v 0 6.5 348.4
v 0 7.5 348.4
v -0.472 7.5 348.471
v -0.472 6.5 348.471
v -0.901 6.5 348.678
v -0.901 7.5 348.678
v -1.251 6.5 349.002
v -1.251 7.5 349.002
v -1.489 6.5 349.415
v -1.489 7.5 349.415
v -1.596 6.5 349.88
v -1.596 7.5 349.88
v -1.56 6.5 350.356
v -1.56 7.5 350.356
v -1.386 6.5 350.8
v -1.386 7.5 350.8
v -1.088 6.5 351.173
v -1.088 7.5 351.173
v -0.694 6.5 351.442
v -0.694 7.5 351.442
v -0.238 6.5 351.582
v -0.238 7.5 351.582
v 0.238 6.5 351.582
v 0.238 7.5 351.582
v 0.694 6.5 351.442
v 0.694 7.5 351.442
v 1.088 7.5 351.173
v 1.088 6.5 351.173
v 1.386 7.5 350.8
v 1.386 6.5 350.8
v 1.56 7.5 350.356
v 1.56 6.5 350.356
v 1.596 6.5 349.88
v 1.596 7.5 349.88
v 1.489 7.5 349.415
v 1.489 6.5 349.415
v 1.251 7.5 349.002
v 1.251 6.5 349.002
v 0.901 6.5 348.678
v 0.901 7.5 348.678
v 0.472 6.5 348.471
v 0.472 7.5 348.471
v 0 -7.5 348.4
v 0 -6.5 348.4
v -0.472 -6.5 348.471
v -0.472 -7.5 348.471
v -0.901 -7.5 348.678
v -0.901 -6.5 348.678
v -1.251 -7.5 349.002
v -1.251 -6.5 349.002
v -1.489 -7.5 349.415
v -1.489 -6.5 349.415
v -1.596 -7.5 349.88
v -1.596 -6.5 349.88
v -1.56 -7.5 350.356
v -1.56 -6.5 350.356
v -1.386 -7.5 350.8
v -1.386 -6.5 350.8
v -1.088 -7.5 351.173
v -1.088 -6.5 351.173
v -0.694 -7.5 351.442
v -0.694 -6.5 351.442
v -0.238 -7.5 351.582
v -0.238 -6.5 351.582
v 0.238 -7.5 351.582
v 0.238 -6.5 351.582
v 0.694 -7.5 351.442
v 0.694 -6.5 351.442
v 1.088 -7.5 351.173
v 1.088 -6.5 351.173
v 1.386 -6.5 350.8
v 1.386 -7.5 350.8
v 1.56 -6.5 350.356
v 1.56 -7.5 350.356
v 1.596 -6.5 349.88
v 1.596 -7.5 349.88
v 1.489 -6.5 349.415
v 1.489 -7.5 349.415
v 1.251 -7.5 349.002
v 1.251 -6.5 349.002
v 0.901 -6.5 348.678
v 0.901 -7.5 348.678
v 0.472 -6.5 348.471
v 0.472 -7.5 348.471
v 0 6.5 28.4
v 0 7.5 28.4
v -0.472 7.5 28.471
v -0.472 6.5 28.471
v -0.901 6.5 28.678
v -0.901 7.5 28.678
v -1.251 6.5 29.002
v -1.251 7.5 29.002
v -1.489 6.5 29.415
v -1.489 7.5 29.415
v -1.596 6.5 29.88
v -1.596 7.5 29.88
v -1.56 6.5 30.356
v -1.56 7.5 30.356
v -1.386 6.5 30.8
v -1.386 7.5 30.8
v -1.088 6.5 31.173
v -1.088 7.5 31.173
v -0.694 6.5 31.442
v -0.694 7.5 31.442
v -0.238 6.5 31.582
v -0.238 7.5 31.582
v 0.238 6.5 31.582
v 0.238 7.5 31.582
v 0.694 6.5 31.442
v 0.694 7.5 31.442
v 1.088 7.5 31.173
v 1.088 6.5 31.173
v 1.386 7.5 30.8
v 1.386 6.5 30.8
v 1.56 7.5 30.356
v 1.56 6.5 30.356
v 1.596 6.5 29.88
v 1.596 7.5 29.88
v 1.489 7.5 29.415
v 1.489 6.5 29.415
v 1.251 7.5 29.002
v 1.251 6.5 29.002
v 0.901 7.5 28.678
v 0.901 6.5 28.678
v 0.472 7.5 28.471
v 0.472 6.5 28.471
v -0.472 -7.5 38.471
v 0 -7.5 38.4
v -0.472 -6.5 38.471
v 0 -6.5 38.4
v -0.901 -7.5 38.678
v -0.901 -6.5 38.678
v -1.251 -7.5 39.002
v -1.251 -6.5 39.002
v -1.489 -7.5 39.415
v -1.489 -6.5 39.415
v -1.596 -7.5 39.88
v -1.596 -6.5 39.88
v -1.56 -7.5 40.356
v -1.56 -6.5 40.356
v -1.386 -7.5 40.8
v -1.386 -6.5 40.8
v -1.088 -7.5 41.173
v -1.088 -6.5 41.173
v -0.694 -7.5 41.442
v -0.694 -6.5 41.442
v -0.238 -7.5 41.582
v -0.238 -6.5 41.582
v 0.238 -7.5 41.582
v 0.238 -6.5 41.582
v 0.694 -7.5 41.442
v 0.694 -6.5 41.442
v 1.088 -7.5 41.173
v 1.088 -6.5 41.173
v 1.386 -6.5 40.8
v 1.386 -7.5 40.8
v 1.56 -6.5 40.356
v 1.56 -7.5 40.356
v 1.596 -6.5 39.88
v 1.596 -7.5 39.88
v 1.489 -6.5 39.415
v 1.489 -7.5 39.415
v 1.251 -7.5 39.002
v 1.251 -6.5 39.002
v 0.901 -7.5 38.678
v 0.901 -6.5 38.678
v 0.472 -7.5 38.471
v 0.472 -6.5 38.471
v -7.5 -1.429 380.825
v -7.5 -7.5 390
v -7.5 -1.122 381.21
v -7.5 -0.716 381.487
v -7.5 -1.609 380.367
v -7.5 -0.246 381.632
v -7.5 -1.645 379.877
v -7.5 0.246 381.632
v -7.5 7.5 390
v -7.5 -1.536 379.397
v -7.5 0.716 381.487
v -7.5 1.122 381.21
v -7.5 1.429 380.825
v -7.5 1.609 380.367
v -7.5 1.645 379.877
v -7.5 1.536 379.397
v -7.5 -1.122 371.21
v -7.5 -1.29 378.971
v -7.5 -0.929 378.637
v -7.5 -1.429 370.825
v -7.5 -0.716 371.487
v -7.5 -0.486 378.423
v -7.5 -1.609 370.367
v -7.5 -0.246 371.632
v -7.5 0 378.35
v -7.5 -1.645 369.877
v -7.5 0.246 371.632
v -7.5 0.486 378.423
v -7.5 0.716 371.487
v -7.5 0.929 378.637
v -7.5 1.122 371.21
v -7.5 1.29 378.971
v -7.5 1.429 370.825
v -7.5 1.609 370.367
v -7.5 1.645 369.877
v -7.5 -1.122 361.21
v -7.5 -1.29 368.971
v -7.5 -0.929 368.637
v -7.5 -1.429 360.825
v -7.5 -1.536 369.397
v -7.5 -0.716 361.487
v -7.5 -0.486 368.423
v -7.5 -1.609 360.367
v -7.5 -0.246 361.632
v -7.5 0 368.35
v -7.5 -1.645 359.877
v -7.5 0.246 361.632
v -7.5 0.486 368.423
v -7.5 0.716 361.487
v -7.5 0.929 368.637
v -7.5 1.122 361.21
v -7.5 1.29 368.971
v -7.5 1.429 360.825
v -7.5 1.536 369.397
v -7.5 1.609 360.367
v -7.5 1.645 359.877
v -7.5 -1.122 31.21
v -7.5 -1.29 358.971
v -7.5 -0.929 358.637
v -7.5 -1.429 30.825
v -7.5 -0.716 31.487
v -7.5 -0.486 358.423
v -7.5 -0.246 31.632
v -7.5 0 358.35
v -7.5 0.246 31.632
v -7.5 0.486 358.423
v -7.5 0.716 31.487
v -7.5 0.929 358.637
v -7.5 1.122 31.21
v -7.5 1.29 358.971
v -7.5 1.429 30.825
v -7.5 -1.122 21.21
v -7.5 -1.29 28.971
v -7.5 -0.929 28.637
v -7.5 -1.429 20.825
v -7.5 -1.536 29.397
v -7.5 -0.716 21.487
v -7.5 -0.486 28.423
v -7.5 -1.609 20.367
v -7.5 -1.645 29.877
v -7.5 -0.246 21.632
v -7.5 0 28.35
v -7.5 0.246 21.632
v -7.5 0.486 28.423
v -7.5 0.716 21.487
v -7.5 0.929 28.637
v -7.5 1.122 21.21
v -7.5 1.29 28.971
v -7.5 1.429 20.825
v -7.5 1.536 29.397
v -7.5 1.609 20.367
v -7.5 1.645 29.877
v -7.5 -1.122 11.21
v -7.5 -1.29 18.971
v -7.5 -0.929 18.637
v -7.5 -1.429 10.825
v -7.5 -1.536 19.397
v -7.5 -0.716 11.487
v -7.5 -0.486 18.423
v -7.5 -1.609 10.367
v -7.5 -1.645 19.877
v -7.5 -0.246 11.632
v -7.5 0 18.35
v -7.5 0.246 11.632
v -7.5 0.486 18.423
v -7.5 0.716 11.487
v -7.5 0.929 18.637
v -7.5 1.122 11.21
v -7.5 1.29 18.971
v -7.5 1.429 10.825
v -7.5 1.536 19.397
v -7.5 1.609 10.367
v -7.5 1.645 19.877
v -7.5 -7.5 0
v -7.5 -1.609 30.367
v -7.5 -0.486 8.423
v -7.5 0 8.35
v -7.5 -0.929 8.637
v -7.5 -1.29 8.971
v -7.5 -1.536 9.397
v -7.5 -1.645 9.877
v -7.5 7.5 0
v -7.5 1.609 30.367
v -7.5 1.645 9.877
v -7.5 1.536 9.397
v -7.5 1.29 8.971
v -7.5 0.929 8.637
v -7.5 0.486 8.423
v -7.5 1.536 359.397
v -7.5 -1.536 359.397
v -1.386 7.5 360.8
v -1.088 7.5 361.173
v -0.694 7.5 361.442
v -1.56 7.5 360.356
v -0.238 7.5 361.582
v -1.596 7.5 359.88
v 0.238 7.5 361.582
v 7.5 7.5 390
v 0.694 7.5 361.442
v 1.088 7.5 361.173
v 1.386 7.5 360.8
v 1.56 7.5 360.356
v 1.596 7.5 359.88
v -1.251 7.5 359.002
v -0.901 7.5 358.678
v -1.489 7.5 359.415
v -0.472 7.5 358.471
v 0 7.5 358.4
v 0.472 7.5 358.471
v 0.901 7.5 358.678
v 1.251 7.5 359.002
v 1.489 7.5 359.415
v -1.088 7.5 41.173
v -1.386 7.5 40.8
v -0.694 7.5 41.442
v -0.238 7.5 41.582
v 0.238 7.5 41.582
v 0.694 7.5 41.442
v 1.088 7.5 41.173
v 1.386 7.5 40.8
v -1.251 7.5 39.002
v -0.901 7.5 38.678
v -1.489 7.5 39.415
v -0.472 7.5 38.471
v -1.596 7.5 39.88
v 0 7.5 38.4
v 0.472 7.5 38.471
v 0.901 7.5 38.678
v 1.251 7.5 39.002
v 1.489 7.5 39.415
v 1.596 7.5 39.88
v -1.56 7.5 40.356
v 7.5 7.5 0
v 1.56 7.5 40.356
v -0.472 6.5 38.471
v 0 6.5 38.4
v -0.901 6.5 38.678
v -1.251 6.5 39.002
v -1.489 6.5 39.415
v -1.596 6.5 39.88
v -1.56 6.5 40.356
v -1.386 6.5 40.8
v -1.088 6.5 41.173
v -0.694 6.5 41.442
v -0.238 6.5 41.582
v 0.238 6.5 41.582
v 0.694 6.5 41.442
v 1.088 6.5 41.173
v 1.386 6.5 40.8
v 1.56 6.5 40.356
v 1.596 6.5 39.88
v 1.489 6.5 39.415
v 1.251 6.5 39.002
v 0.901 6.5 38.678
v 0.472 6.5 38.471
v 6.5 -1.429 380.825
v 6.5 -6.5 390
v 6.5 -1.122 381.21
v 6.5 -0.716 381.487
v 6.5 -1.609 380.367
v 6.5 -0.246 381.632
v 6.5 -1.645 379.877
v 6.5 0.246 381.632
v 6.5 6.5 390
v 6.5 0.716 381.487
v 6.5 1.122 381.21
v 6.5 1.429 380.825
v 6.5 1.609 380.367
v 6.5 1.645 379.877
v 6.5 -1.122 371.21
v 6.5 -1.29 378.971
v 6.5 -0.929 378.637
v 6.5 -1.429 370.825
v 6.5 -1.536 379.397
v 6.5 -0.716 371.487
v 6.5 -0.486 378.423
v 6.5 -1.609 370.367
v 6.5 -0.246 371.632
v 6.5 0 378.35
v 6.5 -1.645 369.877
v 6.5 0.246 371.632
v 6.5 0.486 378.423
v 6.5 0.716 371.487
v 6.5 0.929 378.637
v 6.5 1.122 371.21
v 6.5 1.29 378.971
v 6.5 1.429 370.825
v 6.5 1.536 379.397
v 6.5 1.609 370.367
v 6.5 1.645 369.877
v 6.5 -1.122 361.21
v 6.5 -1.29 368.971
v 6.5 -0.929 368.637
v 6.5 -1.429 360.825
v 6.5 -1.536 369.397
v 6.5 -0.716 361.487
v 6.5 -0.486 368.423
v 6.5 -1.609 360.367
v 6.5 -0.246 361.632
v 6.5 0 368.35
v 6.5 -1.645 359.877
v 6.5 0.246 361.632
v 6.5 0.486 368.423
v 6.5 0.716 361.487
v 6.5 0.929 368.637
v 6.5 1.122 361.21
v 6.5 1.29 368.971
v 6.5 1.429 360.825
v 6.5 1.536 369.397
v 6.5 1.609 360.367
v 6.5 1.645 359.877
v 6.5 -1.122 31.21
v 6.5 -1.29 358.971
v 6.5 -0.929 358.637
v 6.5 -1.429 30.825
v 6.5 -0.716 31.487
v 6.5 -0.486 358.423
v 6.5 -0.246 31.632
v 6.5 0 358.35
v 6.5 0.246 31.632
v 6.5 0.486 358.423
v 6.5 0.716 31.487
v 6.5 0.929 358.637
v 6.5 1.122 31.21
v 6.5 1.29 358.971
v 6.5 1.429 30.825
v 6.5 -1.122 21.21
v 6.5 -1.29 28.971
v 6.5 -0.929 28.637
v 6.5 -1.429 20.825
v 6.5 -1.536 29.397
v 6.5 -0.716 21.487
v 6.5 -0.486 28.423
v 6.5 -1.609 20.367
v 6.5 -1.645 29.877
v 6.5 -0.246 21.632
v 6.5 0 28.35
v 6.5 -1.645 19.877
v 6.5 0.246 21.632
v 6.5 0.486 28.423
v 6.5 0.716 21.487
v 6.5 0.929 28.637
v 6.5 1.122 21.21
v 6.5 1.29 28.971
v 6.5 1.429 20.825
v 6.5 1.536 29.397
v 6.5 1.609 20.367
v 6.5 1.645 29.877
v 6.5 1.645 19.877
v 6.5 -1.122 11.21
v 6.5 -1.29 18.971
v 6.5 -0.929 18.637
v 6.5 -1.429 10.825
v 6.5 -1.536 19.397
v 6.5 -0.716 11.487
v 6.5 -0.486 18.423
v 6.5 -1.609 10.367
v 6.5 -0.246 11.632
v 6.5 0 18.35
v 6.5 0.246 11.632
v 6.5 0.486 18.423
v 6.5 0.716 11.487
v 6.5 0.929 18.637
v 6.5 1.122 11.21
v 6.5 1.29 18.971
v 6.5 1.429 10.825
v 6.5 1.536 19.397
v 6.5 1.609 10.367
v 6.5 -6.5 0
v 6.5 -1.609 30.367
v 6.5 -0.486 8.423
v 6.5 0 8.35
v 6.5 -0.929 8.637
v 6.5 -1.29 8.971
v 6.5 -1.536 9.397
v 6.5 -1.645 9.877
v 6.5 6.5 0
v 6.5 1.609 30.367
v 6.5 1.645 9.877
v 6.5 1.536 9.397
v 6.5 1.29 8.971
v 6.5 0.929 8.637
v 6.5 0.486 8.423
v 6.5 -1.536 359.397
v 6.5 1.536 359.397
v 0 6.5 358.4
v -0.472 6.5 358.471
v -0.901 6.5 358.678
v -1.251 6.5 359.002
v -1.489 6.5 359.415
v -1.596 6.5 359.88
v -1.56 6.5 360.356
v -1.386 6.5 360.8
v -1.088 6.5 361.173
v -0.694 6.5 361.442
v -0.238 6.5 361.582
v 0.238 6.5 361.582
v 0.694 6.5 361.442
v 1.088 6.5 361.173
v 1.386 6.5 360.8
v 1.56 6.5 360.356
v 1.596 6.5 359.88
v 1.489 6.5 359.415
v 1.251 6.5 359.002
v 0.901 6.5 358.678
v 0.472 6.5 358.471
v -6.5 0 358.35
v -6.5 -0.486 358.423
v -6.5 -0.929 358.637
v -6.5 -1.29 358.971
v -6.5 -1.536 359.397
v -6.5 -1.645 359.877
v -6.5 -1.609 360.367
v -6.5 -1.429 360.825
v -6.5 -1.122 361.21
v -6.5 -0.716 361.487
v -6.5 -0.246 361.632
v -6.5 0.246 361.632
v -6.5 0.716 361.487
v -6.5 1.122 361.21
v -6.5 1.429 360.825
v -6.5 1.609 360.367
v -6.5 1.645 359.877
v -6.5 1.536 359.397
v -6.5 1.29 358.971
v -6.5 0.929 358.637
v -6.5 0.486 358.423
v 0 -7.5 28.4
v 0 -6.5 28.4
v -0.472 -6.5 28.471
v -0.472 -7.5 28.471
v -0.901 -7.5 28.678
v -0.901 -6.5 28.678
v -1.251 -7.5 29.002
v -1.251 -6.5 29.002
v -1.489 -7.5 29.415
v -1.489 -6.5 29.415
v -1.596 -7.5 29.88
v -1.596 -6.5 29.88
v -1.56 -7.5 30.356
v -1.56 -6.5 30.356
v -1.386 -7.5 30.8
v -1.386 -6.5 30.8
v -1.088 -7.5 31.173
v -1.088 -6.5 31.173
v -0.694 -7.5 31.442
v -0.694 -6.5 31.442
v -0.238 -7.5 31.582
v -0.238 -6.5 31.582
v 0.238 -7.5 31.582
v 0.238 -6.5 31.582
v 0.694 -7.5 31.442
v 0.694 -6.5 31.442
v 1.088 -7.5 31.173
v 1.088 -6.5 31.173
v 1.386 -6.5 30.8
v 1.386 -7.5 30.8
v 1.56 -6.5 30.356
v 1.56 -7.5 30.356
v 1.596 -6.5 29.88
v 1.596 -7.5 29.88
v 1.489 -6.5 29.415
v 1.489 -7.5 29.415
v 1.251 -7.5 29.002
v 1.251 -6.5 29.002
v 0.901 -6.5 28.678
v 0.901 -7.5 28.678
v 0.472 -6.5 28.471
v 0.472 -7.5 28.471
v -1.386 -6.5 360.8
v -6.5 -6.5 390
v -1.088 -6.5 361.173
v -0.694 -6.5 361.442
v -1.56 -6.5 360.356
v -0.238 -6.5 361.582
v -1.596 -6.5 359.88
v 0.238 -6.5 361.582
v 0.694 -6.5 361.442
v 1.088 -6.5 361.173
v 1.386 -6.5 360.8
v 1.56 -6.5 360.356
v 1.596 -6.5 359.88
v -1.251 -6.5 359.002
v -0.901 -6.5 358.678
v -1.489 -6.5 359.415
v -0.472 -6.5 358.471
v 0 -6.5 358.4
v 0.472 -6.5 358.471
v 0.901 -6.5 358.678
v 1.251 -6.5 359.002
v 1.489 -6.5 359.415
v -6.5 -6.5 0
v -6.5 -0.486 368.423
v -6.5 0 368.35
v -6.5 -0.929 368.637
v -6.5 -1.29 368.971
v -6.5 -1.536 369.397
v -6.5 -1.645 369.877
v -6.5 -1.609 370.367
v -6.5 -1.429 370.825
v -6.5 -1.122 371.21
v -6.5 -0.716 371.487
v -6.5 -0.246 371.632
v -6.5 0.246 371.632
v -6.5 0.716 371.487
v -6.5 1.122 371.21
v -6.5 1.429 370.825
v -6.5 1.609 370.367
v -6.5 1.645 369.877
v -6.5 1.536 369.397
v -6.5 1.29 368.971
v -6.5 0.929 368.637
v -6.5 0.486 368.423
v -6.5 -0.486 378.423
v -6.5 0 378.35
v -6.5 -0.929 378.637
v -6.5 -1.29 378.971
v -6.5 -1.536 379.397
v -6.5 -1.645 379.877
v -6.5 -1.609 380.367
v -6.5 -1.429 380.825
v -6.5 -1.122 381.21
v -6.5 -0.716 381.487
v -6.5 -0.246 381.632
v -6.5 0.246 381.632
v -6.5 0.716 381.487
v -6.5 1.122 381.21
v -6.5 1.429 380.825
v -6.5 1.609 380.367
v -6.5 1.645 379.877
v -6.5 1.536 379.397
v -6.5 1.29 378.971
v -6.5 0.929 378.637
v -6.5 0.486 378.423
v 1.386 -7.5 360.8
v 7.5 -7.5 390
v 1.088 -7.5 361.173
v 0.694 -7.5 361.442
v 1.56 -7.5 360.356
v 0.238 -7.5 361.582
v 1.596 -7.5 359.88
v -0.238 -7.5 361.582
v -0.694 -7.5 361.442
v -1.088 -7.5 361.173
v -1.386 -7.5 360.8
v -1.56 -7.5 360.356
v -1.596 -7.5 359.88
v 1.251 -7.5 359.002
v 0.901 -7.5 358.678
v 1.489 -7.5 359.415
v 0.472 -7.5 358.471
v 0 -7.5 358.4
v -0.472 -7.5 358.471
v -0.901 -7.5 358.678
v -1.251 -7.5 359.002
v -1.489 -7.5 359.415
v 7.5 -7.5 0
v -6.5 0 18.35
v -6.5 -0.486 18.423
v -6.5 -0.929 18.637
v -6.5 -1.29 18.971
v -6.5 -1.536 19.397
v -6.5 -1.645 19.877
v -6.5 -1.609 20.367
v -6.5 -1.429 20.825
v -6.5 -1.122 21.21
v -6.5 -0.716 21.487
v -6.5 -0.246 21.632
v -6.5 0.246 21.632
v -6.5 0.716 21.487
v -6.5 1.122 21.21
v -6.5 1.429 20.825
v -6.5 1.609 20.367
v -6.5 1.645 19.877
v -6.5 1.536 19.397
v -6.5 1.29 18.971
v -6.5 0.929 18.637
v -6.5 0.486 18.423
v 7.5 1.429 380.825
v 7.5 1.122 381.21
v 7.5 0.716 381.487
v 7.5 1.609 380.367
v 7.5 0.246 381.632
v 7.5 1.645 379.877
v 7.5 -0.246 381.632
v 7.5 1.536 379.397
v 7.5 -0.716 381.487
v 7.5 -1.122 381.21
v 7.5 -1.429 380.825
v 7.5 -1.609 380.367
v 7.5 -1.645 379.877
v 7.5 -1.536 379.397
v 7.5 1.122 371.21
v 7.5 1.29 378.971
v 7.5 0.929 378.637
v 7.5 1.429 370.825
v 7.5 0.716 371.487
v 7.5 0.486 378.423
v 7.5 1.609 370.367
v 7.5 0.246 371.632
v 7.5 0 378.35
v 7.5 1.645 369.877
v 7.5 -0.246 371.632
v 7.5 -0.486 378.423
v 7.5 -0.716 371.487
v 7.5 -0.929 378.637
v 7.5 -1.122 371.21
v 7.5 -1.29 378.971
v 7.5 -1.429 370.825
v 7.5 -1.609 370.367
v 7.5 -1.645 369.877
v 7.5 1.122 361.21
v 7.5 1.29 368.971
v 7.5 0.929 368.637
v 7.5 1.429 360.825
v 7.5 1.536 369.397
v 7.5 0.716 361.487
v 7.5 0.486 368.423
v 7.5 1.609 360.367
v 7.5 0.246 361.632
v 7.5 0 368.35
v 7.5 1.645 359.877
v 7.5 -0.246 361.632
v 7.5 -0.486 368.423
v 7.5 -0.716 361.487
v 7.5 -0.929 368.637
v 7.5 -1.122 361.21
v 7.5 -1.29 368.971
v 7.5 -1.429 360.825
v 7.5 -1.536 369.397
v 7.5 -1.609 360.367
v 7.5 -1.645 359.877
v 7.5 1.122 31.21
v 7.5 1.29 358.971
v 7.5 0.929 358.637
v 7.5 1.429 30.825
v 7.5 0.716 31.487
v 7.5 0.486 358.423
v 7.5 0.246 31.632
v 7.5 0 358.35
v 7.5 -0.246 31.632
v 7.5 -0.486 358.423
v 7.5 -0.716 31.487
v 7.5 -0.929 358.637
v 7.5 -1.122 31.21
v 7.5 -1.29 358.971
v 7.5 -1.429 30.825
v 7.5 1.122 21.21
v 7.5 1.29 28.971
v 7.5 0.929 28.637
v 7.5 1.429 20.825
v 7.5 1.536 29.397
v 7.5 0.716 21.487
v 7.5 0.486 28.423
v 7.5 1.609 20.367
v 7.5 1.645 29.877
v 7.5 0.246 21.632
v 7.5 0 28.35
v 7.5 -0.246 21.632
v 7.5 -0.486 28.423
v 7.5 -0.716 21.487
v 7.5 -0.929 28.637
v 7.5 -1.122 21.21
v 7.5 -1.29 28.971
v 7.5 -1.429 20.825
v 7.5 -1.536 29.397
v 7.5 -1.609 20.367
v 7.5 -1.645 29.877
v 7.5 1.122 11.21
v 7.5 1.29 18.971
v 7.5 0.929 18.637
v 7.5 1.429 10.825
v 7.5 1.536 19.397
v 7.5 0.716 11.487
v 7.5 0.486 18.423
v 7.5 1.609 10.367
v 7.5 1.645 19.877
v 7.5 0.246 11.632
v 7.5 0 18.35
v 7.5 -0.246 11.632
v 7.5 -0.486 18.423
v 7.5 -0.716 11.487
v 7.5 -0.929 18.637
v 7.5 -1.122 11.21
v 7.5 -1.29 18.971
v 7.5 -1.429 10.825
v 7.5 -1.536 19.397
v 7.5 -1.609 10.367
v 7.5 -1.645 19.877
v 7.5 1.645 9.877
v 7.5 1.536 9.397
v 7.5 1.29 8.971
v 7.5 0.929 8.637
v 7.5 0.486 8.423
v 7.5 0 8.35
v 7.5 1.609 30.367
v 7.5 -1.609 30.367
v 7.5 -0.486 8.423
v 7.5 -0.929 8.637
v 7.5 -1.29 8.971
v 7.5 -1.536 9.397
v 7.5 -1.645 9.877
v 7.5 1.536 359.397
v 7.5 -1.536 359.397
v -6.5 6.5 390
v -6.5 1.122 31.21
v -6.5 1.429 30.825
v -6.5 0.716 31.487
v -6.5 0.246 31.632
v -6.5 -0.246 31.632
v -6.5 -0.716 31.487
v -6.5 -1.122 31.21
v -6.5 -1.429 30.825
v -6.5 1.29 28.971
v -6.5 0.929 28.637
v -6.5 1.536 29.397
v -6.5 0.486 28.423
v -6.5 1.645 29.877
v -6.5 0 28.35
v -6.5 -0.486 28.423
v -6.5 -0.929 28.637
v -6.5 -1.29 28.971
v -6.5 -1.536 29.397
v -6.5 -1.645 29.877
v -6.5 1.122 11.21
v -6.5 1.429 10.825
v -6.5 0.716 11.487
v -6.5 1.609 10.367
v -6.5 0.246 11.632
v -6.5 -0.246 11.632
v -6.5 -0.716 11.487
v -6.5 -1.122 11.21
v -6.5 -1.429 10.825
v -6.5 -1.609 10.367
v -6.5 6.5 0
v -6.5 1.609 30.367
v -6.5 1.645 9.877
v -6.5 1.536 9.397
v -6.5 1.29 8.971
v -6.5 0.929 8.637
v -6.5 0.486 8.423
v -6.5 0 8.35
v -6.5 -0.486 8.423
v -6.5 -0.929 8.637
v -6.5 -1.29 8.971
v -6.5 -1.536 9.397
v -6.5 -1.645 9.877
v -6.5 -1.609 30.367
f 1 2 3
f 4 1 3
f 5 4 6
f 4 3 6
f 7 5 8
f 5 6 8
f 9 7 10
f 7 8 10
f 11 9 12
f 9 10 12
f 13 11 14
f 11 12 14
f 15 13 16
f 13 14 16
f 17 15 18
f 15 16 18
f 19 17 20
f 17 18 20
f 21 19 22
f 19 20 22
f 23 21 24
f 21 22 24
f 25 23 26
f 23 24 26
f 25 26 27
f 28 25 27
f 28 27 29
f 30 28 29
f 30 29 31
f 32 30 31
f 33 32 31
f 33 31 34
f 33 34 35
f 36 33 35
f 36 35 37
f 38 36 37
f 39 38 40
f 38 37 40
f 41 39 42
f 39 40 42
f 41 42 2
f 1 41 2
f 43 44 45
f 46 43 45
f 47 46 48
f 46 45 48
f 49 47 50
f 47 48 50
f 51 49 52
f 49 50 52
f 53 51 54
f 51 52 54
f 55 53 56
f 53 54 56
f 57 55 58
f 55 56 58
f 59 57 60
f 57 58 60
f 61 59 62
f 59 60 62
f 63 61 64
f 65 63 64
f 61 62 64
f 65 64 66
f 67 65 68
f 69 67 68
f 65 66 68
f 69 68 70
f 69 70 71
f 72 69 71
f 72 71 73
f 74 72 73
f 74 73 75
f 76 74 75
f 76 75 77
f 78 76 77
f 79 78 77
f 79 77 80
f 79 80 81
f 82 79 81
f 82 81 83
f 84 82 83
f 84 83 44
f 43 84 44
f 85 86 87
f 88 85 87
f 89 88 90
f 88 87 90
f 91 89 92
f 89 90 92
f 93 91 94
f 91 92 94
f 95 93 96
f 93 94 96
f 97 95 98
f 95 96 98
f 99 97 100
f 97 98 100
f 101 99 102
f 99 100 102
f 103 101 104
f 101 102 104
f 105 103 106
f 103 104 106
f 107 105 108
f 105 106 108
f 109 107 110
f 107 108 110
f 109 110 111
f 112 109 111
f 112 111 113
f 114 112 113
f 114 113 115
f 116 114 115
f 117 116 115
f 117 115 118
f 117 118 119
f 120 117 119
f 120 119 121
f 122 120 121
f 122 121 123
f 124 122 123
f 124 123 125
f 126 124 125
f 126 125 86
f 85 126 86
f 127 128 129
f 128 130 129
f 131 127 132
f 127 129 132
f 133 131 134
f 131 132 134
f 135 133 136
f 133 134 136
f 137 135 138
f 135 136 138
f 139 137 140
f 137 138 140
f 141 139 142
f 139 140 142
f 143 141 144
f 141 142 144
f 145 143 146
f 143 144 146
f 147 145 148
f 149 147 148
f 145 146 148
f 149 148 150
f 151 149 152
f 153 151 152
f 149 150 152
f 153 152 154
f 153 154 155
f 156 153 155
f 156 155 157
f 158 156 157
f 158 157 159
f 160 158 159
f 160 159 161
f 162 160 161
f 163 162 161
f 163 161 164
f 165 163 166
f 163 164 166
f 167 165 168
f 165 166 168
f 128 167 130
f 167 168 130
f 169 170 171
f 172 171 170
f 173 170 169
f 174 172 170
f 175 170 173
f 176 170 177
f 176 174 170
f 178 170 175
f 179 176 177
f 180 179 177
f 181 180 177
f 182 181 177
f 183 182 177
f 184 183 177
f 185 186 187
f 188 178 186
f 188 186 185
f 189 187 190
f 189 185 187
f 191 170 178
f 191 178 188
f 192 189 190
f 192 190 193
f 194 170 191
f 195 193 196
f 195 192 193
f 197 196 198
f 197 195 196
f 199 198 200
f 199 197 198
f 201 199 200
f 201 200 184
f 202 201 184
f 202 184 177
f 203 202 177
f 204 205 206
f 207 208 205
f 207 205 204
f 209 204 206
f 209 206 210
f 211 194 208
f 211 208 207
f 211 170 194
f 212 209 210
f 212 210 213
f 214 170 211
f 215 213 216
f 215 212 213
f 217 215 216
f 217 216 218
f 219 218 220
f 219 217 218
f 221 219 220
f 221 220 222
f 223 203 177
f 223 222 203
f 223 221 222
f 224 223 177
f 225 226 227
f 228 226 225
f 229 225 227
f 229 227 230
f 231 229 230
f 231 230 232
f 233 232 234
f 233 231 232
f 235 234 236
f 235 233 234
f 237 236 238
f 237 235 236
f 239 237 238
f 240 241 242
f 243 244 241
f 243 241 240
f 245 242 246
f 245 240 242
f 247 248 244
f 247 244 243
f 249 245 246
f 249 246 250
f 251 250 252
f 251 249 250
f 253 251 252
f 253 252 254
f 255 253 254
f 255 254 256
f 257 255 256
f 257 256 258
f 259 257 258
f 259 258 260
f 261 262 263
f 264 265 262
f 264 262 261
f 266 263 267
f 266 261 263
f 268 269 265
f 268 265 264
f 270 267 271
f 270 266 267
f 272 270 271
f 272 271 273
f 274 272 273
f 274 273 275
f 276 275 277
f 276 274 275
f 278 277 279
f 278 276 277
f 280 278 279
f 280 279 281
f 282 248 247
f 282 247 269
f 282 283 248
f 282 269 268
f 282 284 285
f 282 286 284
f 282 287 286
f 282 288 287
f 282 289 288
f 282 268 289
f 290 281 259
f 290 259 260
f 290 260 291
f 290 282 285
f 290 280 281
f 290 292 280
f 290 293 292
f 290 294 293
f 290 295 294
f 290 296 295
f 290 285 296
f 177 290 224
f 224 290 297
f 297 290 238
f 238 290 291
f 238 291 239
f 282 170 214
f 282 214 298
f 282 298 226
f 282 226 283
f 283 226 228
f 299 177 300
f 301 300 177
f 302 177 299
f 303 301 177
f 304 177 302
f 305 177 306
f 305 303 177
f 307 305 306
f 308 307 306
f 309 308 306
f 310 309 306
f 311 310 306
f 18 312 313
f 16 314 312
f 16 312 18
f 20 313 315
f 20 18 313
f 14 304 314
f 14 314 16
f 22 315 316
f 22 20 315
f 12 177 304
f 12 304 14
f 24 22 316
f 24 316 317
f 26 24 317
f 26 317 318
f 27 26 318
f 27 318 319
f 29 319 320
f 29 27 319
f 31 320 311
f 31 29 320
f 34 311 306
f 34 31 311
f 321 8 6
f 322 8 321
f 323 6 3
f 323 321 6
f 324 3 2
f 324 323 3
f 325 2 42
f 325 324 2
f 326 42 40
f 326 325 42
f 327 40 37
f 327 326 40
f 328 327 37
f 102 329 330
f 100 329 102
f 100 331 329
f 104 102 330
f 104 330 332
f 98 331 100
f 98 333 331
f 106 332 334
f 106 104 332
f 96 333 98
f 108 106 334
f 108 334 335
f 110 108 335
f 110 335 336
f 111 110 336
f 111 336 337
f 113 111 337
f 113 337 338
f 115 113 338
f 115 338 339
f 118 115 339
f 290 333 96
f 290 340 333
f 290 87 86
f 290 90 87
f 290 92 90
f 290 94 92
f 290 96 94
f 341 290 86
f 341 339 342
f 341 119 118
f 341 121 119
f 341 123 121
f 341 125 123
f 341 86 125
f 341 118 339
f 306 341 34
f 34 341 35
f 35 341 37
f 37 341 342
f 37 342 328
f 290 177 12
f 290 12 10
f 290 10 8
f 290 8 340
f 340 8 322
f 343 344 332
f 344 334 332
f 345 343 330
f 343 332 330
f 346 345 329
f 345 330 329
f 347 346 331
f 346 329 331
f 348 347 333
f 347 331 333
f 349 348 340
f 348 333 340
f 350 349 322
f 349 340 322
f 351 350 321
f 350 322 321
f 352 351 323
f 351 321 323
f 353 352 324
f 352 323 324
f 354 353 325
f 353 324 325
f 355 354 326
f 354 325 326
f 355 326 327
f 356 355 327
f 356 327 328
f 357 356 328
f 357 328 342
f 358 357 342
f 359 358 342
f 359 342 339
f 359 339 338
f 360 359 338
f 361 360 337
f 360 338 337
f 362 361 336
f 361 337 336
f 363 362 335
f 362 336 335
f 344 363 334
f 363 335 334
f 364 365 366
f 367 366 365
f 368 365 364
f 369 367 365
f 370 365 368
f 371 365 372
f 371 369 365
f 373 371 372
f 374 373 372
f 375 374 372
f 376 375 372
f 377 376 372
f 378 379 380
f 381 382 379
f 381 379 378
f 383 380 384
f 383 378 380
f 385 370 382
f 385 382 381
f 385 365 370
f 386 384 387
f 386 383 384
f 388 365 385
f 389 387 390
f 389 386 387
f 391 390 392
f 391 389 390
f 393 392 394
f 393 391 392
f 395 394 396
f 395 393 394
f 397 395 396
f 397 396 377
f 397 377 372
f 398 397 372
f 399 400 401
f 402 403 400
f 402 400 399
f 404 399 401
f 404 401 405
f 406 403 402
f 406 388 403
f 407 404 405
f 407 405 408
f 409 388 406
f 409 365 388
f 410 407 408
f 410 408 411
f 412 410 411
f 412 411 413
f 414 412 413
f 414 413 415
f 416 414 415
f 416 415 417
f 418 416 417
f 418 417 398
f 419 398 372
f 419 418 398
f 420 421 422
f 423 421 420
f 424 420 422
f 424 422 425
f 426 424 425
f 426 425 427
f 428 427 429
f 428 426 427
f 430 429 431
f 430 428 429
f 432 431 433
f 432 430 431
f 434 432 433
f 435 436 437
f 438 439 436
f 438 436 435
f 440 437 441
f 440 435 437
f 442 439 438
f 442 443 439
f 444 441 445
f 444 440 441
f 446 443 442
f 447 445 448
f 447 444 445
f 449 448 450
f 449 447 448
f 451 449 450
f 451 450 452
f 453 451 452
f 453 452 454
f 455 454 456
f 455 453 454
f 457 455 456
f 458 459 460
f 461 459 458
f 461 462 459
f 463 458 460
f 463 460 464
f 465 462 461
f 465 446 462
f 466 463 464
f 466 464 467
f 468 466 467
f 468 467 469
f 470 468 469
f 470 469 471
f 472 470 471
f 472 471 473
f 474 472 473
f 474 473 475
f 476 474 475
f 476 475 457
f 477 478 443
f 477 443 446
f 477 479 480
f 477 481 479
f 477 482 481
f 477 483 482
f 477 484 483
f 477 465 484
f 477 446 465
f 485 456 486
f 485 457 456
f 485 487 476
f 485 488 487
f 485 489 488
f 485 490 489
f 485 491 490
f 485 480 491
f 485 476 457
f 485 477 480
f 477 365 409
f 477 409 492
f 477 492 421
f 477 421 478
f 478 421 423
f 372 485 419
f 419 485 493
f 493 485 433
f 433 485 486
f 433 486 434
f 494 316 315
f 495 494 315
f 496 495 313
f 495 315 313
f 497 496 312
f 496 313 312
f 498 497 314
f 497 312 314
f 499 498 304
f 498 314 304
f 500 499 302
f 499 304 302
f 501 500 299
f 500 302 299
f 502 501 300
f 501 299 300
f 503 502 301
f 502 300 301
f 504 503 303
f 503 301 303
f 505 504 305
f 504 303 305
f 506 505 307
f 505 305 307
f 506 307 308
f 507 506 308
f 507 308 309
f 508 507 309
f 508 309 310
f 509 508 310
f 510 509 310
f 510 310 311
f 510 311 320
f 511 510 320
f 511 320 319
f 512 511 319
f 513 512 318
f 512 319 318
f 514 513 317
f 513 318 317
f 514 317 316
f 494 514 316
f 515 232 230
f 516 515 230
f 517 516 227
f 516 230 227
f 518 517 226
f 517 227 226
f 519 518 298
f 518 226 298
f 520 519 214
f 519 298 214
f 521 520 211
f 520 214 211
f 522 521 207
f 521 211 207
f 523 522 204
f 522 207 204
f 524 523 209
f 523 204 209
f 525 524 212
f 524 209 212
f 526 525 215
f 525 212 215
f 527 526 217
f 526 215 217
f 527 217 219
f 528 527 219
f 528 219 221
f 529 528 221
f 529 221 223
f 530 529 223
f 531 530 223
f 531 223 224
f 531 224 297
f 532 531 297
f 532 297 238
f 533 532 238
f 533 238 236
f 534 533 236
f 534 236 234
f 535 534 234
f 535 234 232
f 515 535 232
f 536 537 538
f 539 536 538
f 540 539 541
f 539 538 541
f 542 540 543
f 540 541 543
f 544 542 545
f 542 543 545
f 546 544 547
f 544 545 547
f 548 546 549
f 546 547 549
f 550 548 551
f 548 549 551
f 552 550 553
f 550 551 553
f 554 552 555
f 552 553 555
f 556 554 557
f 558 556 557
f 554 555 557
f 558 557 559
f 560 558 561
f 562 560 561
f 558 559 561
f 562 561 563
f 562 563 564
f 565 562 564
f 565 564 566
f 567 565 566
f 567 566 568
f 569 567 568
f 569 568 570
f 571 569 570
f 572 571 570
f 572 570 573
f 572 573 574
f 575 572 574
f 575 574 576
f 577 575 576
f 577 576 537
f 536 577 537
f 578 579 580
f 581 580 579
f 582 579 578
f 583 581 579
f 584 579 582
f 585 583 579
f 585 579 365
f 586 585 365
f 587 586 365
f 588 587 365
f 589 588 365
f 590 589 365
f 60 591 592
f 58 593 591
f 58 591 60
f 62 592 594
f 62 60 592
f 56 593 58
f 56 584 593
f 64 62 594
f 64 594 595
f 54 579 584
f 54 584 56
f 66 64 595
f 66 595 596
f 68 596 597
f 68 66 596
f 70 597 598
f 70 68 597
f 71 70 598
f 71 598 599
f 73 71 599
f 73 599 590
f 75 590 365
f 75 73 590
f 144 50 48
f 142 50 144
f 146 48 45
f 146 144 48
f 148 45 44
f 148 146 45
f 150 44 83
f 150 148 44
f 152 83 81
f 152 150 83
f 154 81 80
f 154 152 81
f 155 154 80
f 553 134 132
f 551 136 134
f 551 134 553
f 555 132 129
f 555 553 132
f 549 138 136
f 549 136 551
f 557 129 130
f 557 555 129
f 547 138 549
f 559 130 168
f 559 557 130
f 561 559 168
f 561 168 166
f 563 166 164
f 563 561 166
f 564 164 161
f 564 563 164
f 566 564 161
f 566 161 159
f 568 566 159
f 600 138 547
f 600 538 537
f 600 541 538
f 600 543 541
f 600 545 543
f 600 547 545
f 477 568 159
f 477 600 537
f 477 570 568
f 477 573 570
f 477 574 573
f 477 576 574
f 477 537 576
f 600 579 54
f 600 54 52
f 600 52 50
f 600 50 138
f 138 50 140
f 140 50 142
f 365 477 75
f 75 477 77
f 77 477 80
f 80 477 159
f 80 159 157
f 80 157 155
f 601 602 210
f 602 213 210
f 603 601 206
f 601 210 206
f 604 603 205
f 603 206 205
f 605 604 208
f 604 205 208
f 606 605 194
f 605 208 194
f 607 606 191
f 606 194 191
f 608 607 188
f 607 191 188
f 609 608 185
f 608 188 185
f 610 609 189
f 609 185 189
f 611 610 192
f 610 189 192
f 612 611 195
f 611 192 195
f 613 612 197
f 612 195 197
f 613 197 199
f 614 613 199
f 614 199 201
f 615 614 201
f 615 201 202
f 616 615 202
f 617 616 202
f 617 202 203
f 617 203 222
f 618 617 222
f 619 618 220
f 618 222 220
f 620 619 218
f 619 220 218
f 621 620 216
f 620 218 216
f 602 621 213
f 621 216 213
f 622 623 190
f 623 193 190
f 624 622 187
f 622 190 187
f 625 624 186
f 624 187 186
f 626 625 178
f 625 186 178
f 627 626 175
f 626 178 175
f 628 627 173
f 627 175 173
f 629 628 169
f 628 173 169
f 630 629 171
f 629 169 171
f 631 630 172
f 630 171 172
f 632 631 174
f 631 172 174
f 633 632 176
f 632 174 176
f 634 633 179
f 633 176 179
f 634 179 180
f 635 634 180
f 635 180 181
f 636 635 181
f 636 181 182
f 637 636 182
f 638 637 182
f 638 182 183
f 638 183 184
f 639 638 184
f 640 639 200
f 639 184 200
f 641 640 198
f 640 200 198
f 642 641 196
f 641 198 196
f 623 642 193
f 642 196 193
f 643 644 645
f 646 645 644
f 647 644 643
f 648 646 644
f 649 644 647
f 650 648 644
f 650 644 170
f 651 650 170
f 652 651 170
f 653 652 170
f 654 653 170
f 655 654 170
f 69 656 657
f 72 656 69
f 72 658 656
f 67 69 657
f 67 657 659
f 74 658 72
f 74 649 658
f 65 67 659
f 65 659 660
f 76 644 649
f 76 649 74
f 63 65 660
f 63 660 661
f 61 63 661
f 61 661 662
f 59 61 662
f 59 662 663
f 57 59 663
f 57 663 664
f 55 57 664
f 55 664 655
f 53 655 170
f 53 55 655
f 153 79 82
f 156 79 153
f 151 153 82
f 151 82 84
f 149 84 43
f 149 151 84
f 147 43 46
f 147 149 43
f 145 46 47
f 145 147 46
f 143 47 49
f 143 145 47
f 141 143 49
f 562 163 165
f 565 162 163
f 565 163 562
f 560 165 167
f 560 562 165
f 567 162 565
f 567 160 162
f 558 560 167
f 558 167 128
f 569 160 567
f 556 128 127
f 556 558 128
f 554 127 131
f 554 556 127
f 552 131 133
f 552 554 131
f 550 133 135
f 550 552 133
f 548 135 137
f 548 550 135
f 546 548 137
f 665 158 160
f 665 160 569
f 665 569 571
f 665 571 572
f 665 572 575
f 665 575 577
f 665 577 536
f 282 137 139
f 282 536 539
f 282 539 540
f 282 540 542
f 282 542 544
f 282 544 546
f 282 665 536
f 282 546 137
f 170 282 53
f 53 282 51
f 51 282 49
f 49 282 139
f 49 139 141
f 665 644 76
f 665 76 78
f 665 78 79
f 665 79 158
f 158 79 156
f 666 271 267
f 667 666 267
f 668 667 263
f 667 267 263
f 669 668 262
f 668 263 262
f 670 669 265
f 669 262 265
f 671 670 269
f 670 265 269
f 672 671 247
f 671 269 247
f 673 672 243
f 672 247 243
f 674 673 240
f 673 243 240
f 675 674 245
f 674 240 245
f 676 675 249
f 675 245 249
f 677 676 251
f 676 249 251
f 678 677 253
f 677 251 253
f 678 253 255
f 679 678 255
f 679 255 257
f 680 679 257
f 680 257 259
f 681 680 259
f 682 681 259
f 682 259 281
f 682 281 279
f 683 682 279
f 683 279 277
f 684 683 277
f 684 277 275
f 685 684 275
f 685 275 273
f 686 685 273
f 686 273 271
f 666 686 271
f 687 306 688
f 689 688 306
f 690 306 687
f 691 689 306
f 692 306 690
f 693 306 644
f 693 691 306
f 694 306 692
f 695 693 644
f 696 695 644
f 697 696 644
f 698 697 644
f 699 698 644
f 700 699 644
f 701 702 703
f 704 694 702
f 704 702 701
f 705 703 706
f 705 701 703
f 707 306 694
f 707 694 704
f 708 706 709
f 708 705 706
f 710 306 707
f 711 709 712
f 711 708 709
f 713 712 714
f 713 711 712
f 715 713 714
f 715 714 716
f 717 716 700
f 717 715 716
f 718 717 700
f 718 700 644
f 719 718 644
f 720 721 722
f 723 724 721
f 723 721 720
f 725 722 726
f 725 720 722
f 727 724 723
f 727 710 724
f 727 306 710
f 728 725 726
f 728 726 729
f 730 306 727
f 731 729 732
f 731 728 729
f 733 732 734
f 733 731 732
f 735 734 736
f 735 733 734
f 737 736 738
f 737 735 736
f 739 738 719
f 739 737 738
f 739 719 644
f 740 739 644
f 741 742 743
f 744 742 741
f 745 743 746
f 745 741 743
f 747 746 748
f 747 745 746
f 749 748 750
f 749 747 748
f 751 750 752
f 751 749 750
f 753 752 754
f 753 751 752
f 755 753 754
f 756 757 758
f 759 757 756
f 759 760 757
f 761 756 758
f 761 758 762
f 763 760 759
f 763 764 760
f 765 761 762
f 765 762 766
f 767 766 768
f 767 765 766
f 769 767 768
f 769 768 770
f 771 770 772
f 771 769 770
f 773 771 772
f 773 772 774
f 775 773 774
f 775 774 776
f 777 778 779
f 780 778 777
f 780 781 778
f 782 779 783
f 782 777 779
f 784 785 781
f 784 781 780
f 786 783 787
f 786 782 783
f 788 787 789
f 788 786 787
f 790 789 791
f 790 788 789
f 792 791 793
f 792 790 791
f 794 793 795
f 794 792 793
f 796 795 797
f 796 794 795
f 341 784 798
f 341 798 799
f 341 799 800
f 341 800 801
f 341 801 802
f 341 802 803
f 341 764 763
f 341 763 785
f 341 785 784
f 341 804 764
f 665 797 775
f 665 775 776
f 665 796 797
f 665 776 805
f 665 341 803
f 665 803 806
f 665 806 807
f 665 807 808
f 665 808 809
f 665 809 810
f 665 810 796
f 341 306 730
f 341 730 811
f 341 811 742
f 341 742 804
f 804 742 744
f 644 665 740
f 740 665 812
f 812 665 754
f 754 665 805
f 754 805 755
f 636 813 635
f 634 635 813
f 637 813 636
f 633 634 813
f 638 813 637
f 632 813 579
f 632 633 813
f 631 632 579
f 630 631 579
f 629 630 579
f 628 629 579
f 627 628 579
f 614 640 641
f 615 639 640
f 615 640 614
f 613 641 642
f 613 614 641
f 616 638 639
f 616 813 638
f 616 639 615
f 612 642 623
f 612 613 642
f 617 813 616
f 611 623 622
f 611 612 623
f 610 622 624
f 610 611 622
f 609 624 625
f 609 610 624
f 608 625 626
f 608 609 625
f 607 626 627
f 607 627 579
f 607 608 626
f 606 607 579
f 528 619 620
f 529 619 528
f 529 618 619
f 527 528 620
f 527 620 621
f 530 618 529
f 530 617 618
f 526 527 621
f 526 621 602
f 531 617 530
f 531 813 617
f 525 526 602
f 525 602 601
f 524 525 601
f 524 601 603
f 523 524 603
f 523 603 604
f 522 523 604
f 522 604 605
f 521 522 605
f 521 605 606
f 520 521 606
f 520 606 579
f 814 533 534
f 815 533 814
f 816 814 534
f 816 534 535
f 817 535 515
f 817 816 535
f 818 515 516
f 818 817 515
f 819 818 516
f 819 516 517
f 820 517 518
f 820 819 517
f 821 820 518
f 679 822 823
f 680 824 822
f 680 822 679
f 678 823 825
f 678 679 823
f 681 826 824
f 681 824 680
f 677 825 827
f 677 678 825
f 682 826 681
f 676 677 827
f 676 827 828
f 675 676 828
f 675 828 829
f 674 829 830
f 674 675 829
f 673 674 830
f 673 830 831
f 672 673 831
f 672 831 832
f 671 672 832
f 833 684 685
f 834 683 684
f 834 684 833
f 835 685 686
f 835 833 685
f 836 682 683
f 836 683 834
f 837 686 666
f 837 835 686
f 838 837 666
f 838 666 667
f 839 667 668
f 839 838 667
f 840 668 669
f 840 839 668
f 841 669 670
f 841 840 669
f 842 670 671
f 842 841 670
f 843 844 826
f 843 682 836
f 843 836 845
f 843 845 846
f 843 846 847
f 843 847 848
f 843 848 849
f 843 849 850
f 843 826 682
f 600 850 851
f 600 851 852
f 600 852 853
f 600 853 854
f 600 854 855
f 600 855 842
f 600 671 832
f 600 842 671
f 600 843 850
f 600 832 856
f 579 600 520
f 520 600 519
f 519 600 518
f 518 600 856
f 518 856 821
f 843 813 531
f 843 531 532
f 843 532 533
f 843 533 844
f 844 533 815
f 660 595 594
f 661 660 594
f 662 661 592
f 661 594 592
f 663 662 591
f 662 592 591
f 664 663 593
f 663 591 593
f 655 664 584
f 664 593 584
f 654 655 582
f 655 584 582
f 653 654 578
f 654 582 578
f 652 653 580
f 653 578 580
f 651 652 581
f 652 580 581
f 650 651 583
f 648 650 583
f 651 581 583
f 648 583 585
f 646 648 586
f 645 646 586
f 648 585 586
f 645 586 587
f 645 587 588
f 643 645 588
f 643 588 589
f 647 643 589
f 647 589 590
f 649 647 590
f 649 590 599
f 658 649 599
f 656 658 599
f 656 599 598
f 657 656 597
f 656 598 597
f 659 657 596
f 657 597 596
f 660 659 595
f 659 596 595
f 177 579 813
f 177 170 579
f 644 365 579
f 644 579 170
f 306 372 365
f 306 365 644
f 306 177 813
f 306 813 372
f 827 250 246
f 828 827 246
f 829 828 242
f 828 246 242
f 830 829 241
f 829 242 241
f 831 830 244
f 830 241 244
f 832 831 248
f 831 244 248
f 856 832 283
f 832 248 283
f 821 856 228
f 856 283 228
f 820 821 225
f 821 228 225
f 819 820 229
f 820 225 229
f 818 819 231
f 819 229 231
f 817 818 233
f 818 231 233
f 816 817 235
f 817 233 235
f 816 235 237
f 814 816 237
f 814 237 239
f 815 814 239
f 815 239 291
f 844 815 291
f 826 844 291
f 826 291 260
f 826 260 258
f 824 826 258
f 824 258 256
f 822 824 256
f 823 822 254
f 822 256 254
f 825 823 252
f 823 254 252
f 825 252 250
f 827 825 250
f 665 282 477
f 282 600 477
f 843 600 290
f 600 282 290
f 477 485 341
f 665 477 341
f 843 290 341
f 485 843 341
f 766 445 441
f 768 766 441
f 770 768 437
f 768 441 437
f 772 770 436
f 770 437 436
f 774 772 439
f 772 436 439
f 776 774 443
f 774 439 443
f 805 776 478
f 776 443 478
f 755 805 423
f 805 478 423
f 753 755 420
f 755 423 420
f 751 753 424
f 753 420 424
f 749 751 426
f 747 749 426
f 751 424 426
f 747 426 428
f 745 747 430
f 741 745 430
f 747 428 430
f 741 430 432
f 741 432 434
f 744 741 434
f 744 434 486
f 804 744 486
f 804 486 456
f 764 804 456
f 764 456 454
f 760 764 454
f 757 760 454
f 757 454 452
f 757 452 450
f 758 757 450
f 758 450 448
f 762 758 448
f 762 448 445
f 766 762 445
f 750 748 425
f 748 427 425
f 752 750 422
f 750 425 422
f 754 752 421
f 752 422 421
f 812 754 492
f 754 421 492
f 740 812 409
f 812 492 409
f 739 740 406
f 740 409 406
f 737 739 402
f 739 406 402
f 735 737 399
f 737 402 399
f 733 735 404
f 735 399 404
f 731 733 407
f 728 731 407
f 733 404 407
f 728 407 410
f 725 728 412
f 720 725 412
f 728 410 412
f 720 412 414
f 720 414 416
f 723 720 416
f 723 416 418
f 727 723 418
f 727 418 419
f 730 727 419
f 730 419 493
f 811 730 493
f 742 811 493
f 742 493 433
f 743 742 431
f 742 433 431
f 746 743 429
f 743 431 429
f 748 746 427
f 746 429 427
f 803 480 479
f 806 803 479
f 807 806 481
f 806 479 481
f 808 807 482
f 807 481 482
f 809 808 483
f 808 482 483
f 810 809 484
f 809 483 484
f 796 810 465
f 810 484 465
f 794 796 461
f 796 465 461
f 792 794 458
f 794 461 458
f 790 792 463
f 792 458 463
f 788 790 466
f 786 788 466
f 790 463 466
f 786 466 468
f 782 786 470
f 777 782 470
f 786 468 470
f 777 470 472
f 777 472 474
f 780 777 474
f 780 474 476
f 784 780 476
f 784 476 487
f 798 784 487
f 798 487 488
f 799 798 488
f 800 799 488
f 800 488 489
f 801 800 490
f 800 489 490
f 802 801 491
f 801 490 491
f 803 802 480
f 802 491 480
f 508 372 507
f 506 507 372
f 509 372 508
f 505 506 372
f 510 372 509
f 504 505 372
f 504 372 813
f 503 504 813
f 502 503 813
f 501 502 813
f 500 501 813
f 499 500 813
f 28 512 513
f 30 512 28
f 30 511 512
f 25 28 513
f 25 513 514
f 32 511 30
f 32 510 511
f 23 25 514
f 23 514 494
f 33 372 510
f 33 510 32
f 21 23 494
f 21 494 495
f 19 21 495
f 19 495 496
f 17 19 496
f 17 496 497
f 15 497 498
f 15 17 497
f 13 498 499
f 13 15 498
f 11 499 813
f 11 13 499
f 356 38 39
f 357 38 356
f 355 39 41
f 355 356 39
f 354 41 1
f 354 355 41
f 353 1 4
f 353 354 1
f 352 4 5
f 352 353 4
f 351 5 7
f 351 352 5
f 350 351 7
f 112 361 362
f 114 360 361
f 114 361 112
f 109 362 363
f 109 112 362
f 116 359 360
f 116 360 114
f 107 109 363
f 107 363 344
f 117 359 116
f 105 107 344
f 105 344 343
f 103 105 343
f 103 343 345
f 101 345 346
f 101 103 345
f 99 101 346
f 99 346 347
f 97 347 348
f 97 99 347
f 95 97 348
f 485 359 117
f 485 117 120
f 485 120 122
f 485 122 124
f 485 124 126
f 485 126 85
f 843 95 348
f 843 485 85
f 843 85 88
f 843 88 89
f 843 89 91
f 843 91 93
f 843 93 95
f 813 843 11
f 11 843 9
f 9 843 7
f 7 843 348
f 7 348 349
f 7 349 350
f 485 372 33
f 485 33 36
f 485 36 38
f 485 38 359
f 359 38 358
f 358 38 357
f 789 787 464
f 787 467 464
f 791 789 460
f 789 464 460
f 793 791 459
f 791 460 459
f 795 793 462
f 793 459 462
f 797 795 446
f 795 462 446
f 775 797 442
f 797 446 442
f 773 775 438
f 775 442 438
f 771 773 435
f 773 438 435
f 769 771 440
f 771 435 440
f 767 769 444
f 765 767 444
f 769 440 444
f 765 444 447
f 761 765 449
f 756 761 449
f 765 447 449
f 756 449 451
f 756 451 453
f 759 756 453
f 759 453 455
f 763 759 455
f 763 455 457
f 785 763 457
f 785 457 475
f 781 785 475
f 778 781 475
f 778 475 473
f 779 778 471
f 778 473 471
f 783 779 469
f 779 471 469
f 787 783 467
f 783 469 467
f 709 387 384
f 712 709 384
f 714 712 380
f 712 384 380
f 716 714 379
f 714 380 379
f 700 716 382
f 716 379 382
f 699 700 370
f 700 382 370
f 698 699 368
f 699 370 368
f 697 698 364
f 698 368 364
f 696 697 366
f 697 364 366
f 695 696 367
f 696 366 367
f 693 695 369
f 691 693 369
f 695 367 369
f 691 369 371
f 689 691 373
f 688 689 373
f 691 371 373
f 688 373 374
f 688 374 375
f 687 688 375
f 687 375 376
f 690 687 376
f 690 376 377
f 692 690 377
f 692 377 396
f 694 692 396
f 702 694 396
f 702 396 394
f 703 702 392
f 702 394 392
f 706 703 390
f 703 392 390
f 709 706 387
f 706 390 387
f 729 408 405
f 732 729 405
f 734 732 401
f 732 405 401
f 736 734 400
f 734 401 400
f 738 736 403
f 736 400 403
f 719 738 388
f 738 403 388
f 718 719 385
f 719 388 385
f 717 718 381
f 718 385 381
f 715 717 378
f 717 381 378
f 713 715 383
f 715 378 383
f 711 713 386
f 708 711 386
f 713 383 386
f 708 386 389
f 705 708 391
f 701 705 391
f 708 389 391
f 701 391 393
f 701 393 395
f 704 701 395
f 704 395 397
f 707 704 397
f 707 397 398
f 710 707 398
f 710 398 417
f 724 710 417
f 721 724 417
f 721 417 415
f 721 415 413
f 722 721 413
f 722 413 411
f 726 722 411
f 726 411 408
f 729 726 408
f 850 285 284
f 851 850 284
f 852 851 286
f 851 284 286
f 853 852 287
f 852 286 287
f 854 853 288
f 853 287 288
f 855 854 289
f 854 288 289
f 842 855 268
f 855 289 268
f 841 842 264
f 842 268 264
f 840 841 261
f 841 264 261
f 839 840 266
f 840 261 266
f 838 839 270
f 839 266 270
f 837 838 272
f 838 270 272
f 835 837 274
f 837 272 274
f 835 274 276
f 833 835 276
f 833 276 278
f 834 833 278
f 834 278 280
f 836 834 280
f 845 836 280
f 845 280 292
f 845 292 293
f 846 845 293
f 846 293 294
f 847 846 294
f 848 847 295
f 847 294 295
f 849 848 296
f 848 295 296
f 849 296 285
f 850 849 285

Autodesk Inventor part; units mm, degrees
ref_plane "YZ Plane" through (0, 0, 0) normal (1, 0, 0) x (0, 1, 0)
ref_plane "XZ Plane" through (0, 0, 0) normal (0, 1, 0) x (-1, 0, 0)
ref_plane "XY Plane" through (0, 0, 0) normal (0, 0, 1) x (1, 0, 0)
sketch "スケッチ1" plane through (0, 0, 0) normal (0, 0, 1) x (1, 0, 0)
  line L0 (7.5, -7.5) -> (-7.5, -7.5)
  line L1 (-7.5, -7.5) -> (-7.5, 7.5)
  line L2 (-7.5, 7.5) -> (7.5, 7.5)
  line L3 (7.5, 7.5) -> (7.5, -7.5)
  line L4 (7.5, -7.5) -> (-7.5, 7.5) construction
  line L5 (-7.5, -7.5) -> (7.5, 7.5) construction
  line L6 (6.5, 6.5) -> (-6.5, 6.5)
  line L7 (-6.5, 6.5) -> (-6.5, -6.5)
  line L8 (-6.5, -6.5) -> (6.5, -6.5)
  line L9 (6.5, -6.5) -> (6.5, 6.5)
  point P0 (0, 0)
  dimension "d0" = 15
  dimension "d1" = 15
  dimension "d2" = 1
extrude "押し出し1" add sketch "スケッチ1" along normal blind 390
sketch "スケッチ2" plane through (7.5, -7.5, 0) normal (1, 0, 0) x (0, 0, -1)
  line L0 (0, 0) -> (0, 15) projected
  line L1 (0, 15) -> (-390, 15) projected
  line L2 (-390, 0) -> (-390, 15) projected
  line L3 (0, 0) -> (-390, 0) projected
  line L4 (0, 7.5) -> (-390, 7.5)
  point P0 (-380, 7.5)
  point P1 (-370, 7.5)
  point P2 (-10, 7.5)
  point P3 (-20, 7.5)
  point P4 (-360, 7.5)
  point P5 (-30, 7.5)
  dimension "d5" = 10
  dimension "d6" = 10
  dimension "d7" = 10
  dimension "d8" = 10
  dimension "d27" = 10
  dimension "d28" = 10
hole "穴1" at (7.5, 0, 380) at (7.5, 0, 370) at (7.5, 0, 10) at (7.5, 0, 20) at (7.5, 0, 30) at (7.5, 0, 360) direction (-1, 0, 0) diameter 3.3 end through all
sketch "スケッチ3" plane through (-7.5, -7.5, 0) normal (0, -1, 0) x (1, 0, 0)
  line L0 (0, 0) -> (15, 0) projected
  line L1 (15, 0) -> (15, 390) projected
  line L2 (0, 390) -> (15, 390) projected
  line L3 (0, 0) -> (0, 390) projected
  line L4 (7.5, 0) -> (7.5, 390)
  point P0 (7.5, 360)
  point P1 (7.5, 350)
  point P2 (7.5, 40)
  point P3 (7.5, 30)
  dimension "d16" = 10
  dimension "d17" = 10
  dimension "d18" = 30
  dimension "d19" = 30
hole "穴2" at (0, -7.5, 360) at (0, -7.5, 350) at (0, -7.5, 40) at (0, -7.5, 30) direction (0, 1, 0) diameter 3.2 end through all
properties part number "light_kaku_connect"
